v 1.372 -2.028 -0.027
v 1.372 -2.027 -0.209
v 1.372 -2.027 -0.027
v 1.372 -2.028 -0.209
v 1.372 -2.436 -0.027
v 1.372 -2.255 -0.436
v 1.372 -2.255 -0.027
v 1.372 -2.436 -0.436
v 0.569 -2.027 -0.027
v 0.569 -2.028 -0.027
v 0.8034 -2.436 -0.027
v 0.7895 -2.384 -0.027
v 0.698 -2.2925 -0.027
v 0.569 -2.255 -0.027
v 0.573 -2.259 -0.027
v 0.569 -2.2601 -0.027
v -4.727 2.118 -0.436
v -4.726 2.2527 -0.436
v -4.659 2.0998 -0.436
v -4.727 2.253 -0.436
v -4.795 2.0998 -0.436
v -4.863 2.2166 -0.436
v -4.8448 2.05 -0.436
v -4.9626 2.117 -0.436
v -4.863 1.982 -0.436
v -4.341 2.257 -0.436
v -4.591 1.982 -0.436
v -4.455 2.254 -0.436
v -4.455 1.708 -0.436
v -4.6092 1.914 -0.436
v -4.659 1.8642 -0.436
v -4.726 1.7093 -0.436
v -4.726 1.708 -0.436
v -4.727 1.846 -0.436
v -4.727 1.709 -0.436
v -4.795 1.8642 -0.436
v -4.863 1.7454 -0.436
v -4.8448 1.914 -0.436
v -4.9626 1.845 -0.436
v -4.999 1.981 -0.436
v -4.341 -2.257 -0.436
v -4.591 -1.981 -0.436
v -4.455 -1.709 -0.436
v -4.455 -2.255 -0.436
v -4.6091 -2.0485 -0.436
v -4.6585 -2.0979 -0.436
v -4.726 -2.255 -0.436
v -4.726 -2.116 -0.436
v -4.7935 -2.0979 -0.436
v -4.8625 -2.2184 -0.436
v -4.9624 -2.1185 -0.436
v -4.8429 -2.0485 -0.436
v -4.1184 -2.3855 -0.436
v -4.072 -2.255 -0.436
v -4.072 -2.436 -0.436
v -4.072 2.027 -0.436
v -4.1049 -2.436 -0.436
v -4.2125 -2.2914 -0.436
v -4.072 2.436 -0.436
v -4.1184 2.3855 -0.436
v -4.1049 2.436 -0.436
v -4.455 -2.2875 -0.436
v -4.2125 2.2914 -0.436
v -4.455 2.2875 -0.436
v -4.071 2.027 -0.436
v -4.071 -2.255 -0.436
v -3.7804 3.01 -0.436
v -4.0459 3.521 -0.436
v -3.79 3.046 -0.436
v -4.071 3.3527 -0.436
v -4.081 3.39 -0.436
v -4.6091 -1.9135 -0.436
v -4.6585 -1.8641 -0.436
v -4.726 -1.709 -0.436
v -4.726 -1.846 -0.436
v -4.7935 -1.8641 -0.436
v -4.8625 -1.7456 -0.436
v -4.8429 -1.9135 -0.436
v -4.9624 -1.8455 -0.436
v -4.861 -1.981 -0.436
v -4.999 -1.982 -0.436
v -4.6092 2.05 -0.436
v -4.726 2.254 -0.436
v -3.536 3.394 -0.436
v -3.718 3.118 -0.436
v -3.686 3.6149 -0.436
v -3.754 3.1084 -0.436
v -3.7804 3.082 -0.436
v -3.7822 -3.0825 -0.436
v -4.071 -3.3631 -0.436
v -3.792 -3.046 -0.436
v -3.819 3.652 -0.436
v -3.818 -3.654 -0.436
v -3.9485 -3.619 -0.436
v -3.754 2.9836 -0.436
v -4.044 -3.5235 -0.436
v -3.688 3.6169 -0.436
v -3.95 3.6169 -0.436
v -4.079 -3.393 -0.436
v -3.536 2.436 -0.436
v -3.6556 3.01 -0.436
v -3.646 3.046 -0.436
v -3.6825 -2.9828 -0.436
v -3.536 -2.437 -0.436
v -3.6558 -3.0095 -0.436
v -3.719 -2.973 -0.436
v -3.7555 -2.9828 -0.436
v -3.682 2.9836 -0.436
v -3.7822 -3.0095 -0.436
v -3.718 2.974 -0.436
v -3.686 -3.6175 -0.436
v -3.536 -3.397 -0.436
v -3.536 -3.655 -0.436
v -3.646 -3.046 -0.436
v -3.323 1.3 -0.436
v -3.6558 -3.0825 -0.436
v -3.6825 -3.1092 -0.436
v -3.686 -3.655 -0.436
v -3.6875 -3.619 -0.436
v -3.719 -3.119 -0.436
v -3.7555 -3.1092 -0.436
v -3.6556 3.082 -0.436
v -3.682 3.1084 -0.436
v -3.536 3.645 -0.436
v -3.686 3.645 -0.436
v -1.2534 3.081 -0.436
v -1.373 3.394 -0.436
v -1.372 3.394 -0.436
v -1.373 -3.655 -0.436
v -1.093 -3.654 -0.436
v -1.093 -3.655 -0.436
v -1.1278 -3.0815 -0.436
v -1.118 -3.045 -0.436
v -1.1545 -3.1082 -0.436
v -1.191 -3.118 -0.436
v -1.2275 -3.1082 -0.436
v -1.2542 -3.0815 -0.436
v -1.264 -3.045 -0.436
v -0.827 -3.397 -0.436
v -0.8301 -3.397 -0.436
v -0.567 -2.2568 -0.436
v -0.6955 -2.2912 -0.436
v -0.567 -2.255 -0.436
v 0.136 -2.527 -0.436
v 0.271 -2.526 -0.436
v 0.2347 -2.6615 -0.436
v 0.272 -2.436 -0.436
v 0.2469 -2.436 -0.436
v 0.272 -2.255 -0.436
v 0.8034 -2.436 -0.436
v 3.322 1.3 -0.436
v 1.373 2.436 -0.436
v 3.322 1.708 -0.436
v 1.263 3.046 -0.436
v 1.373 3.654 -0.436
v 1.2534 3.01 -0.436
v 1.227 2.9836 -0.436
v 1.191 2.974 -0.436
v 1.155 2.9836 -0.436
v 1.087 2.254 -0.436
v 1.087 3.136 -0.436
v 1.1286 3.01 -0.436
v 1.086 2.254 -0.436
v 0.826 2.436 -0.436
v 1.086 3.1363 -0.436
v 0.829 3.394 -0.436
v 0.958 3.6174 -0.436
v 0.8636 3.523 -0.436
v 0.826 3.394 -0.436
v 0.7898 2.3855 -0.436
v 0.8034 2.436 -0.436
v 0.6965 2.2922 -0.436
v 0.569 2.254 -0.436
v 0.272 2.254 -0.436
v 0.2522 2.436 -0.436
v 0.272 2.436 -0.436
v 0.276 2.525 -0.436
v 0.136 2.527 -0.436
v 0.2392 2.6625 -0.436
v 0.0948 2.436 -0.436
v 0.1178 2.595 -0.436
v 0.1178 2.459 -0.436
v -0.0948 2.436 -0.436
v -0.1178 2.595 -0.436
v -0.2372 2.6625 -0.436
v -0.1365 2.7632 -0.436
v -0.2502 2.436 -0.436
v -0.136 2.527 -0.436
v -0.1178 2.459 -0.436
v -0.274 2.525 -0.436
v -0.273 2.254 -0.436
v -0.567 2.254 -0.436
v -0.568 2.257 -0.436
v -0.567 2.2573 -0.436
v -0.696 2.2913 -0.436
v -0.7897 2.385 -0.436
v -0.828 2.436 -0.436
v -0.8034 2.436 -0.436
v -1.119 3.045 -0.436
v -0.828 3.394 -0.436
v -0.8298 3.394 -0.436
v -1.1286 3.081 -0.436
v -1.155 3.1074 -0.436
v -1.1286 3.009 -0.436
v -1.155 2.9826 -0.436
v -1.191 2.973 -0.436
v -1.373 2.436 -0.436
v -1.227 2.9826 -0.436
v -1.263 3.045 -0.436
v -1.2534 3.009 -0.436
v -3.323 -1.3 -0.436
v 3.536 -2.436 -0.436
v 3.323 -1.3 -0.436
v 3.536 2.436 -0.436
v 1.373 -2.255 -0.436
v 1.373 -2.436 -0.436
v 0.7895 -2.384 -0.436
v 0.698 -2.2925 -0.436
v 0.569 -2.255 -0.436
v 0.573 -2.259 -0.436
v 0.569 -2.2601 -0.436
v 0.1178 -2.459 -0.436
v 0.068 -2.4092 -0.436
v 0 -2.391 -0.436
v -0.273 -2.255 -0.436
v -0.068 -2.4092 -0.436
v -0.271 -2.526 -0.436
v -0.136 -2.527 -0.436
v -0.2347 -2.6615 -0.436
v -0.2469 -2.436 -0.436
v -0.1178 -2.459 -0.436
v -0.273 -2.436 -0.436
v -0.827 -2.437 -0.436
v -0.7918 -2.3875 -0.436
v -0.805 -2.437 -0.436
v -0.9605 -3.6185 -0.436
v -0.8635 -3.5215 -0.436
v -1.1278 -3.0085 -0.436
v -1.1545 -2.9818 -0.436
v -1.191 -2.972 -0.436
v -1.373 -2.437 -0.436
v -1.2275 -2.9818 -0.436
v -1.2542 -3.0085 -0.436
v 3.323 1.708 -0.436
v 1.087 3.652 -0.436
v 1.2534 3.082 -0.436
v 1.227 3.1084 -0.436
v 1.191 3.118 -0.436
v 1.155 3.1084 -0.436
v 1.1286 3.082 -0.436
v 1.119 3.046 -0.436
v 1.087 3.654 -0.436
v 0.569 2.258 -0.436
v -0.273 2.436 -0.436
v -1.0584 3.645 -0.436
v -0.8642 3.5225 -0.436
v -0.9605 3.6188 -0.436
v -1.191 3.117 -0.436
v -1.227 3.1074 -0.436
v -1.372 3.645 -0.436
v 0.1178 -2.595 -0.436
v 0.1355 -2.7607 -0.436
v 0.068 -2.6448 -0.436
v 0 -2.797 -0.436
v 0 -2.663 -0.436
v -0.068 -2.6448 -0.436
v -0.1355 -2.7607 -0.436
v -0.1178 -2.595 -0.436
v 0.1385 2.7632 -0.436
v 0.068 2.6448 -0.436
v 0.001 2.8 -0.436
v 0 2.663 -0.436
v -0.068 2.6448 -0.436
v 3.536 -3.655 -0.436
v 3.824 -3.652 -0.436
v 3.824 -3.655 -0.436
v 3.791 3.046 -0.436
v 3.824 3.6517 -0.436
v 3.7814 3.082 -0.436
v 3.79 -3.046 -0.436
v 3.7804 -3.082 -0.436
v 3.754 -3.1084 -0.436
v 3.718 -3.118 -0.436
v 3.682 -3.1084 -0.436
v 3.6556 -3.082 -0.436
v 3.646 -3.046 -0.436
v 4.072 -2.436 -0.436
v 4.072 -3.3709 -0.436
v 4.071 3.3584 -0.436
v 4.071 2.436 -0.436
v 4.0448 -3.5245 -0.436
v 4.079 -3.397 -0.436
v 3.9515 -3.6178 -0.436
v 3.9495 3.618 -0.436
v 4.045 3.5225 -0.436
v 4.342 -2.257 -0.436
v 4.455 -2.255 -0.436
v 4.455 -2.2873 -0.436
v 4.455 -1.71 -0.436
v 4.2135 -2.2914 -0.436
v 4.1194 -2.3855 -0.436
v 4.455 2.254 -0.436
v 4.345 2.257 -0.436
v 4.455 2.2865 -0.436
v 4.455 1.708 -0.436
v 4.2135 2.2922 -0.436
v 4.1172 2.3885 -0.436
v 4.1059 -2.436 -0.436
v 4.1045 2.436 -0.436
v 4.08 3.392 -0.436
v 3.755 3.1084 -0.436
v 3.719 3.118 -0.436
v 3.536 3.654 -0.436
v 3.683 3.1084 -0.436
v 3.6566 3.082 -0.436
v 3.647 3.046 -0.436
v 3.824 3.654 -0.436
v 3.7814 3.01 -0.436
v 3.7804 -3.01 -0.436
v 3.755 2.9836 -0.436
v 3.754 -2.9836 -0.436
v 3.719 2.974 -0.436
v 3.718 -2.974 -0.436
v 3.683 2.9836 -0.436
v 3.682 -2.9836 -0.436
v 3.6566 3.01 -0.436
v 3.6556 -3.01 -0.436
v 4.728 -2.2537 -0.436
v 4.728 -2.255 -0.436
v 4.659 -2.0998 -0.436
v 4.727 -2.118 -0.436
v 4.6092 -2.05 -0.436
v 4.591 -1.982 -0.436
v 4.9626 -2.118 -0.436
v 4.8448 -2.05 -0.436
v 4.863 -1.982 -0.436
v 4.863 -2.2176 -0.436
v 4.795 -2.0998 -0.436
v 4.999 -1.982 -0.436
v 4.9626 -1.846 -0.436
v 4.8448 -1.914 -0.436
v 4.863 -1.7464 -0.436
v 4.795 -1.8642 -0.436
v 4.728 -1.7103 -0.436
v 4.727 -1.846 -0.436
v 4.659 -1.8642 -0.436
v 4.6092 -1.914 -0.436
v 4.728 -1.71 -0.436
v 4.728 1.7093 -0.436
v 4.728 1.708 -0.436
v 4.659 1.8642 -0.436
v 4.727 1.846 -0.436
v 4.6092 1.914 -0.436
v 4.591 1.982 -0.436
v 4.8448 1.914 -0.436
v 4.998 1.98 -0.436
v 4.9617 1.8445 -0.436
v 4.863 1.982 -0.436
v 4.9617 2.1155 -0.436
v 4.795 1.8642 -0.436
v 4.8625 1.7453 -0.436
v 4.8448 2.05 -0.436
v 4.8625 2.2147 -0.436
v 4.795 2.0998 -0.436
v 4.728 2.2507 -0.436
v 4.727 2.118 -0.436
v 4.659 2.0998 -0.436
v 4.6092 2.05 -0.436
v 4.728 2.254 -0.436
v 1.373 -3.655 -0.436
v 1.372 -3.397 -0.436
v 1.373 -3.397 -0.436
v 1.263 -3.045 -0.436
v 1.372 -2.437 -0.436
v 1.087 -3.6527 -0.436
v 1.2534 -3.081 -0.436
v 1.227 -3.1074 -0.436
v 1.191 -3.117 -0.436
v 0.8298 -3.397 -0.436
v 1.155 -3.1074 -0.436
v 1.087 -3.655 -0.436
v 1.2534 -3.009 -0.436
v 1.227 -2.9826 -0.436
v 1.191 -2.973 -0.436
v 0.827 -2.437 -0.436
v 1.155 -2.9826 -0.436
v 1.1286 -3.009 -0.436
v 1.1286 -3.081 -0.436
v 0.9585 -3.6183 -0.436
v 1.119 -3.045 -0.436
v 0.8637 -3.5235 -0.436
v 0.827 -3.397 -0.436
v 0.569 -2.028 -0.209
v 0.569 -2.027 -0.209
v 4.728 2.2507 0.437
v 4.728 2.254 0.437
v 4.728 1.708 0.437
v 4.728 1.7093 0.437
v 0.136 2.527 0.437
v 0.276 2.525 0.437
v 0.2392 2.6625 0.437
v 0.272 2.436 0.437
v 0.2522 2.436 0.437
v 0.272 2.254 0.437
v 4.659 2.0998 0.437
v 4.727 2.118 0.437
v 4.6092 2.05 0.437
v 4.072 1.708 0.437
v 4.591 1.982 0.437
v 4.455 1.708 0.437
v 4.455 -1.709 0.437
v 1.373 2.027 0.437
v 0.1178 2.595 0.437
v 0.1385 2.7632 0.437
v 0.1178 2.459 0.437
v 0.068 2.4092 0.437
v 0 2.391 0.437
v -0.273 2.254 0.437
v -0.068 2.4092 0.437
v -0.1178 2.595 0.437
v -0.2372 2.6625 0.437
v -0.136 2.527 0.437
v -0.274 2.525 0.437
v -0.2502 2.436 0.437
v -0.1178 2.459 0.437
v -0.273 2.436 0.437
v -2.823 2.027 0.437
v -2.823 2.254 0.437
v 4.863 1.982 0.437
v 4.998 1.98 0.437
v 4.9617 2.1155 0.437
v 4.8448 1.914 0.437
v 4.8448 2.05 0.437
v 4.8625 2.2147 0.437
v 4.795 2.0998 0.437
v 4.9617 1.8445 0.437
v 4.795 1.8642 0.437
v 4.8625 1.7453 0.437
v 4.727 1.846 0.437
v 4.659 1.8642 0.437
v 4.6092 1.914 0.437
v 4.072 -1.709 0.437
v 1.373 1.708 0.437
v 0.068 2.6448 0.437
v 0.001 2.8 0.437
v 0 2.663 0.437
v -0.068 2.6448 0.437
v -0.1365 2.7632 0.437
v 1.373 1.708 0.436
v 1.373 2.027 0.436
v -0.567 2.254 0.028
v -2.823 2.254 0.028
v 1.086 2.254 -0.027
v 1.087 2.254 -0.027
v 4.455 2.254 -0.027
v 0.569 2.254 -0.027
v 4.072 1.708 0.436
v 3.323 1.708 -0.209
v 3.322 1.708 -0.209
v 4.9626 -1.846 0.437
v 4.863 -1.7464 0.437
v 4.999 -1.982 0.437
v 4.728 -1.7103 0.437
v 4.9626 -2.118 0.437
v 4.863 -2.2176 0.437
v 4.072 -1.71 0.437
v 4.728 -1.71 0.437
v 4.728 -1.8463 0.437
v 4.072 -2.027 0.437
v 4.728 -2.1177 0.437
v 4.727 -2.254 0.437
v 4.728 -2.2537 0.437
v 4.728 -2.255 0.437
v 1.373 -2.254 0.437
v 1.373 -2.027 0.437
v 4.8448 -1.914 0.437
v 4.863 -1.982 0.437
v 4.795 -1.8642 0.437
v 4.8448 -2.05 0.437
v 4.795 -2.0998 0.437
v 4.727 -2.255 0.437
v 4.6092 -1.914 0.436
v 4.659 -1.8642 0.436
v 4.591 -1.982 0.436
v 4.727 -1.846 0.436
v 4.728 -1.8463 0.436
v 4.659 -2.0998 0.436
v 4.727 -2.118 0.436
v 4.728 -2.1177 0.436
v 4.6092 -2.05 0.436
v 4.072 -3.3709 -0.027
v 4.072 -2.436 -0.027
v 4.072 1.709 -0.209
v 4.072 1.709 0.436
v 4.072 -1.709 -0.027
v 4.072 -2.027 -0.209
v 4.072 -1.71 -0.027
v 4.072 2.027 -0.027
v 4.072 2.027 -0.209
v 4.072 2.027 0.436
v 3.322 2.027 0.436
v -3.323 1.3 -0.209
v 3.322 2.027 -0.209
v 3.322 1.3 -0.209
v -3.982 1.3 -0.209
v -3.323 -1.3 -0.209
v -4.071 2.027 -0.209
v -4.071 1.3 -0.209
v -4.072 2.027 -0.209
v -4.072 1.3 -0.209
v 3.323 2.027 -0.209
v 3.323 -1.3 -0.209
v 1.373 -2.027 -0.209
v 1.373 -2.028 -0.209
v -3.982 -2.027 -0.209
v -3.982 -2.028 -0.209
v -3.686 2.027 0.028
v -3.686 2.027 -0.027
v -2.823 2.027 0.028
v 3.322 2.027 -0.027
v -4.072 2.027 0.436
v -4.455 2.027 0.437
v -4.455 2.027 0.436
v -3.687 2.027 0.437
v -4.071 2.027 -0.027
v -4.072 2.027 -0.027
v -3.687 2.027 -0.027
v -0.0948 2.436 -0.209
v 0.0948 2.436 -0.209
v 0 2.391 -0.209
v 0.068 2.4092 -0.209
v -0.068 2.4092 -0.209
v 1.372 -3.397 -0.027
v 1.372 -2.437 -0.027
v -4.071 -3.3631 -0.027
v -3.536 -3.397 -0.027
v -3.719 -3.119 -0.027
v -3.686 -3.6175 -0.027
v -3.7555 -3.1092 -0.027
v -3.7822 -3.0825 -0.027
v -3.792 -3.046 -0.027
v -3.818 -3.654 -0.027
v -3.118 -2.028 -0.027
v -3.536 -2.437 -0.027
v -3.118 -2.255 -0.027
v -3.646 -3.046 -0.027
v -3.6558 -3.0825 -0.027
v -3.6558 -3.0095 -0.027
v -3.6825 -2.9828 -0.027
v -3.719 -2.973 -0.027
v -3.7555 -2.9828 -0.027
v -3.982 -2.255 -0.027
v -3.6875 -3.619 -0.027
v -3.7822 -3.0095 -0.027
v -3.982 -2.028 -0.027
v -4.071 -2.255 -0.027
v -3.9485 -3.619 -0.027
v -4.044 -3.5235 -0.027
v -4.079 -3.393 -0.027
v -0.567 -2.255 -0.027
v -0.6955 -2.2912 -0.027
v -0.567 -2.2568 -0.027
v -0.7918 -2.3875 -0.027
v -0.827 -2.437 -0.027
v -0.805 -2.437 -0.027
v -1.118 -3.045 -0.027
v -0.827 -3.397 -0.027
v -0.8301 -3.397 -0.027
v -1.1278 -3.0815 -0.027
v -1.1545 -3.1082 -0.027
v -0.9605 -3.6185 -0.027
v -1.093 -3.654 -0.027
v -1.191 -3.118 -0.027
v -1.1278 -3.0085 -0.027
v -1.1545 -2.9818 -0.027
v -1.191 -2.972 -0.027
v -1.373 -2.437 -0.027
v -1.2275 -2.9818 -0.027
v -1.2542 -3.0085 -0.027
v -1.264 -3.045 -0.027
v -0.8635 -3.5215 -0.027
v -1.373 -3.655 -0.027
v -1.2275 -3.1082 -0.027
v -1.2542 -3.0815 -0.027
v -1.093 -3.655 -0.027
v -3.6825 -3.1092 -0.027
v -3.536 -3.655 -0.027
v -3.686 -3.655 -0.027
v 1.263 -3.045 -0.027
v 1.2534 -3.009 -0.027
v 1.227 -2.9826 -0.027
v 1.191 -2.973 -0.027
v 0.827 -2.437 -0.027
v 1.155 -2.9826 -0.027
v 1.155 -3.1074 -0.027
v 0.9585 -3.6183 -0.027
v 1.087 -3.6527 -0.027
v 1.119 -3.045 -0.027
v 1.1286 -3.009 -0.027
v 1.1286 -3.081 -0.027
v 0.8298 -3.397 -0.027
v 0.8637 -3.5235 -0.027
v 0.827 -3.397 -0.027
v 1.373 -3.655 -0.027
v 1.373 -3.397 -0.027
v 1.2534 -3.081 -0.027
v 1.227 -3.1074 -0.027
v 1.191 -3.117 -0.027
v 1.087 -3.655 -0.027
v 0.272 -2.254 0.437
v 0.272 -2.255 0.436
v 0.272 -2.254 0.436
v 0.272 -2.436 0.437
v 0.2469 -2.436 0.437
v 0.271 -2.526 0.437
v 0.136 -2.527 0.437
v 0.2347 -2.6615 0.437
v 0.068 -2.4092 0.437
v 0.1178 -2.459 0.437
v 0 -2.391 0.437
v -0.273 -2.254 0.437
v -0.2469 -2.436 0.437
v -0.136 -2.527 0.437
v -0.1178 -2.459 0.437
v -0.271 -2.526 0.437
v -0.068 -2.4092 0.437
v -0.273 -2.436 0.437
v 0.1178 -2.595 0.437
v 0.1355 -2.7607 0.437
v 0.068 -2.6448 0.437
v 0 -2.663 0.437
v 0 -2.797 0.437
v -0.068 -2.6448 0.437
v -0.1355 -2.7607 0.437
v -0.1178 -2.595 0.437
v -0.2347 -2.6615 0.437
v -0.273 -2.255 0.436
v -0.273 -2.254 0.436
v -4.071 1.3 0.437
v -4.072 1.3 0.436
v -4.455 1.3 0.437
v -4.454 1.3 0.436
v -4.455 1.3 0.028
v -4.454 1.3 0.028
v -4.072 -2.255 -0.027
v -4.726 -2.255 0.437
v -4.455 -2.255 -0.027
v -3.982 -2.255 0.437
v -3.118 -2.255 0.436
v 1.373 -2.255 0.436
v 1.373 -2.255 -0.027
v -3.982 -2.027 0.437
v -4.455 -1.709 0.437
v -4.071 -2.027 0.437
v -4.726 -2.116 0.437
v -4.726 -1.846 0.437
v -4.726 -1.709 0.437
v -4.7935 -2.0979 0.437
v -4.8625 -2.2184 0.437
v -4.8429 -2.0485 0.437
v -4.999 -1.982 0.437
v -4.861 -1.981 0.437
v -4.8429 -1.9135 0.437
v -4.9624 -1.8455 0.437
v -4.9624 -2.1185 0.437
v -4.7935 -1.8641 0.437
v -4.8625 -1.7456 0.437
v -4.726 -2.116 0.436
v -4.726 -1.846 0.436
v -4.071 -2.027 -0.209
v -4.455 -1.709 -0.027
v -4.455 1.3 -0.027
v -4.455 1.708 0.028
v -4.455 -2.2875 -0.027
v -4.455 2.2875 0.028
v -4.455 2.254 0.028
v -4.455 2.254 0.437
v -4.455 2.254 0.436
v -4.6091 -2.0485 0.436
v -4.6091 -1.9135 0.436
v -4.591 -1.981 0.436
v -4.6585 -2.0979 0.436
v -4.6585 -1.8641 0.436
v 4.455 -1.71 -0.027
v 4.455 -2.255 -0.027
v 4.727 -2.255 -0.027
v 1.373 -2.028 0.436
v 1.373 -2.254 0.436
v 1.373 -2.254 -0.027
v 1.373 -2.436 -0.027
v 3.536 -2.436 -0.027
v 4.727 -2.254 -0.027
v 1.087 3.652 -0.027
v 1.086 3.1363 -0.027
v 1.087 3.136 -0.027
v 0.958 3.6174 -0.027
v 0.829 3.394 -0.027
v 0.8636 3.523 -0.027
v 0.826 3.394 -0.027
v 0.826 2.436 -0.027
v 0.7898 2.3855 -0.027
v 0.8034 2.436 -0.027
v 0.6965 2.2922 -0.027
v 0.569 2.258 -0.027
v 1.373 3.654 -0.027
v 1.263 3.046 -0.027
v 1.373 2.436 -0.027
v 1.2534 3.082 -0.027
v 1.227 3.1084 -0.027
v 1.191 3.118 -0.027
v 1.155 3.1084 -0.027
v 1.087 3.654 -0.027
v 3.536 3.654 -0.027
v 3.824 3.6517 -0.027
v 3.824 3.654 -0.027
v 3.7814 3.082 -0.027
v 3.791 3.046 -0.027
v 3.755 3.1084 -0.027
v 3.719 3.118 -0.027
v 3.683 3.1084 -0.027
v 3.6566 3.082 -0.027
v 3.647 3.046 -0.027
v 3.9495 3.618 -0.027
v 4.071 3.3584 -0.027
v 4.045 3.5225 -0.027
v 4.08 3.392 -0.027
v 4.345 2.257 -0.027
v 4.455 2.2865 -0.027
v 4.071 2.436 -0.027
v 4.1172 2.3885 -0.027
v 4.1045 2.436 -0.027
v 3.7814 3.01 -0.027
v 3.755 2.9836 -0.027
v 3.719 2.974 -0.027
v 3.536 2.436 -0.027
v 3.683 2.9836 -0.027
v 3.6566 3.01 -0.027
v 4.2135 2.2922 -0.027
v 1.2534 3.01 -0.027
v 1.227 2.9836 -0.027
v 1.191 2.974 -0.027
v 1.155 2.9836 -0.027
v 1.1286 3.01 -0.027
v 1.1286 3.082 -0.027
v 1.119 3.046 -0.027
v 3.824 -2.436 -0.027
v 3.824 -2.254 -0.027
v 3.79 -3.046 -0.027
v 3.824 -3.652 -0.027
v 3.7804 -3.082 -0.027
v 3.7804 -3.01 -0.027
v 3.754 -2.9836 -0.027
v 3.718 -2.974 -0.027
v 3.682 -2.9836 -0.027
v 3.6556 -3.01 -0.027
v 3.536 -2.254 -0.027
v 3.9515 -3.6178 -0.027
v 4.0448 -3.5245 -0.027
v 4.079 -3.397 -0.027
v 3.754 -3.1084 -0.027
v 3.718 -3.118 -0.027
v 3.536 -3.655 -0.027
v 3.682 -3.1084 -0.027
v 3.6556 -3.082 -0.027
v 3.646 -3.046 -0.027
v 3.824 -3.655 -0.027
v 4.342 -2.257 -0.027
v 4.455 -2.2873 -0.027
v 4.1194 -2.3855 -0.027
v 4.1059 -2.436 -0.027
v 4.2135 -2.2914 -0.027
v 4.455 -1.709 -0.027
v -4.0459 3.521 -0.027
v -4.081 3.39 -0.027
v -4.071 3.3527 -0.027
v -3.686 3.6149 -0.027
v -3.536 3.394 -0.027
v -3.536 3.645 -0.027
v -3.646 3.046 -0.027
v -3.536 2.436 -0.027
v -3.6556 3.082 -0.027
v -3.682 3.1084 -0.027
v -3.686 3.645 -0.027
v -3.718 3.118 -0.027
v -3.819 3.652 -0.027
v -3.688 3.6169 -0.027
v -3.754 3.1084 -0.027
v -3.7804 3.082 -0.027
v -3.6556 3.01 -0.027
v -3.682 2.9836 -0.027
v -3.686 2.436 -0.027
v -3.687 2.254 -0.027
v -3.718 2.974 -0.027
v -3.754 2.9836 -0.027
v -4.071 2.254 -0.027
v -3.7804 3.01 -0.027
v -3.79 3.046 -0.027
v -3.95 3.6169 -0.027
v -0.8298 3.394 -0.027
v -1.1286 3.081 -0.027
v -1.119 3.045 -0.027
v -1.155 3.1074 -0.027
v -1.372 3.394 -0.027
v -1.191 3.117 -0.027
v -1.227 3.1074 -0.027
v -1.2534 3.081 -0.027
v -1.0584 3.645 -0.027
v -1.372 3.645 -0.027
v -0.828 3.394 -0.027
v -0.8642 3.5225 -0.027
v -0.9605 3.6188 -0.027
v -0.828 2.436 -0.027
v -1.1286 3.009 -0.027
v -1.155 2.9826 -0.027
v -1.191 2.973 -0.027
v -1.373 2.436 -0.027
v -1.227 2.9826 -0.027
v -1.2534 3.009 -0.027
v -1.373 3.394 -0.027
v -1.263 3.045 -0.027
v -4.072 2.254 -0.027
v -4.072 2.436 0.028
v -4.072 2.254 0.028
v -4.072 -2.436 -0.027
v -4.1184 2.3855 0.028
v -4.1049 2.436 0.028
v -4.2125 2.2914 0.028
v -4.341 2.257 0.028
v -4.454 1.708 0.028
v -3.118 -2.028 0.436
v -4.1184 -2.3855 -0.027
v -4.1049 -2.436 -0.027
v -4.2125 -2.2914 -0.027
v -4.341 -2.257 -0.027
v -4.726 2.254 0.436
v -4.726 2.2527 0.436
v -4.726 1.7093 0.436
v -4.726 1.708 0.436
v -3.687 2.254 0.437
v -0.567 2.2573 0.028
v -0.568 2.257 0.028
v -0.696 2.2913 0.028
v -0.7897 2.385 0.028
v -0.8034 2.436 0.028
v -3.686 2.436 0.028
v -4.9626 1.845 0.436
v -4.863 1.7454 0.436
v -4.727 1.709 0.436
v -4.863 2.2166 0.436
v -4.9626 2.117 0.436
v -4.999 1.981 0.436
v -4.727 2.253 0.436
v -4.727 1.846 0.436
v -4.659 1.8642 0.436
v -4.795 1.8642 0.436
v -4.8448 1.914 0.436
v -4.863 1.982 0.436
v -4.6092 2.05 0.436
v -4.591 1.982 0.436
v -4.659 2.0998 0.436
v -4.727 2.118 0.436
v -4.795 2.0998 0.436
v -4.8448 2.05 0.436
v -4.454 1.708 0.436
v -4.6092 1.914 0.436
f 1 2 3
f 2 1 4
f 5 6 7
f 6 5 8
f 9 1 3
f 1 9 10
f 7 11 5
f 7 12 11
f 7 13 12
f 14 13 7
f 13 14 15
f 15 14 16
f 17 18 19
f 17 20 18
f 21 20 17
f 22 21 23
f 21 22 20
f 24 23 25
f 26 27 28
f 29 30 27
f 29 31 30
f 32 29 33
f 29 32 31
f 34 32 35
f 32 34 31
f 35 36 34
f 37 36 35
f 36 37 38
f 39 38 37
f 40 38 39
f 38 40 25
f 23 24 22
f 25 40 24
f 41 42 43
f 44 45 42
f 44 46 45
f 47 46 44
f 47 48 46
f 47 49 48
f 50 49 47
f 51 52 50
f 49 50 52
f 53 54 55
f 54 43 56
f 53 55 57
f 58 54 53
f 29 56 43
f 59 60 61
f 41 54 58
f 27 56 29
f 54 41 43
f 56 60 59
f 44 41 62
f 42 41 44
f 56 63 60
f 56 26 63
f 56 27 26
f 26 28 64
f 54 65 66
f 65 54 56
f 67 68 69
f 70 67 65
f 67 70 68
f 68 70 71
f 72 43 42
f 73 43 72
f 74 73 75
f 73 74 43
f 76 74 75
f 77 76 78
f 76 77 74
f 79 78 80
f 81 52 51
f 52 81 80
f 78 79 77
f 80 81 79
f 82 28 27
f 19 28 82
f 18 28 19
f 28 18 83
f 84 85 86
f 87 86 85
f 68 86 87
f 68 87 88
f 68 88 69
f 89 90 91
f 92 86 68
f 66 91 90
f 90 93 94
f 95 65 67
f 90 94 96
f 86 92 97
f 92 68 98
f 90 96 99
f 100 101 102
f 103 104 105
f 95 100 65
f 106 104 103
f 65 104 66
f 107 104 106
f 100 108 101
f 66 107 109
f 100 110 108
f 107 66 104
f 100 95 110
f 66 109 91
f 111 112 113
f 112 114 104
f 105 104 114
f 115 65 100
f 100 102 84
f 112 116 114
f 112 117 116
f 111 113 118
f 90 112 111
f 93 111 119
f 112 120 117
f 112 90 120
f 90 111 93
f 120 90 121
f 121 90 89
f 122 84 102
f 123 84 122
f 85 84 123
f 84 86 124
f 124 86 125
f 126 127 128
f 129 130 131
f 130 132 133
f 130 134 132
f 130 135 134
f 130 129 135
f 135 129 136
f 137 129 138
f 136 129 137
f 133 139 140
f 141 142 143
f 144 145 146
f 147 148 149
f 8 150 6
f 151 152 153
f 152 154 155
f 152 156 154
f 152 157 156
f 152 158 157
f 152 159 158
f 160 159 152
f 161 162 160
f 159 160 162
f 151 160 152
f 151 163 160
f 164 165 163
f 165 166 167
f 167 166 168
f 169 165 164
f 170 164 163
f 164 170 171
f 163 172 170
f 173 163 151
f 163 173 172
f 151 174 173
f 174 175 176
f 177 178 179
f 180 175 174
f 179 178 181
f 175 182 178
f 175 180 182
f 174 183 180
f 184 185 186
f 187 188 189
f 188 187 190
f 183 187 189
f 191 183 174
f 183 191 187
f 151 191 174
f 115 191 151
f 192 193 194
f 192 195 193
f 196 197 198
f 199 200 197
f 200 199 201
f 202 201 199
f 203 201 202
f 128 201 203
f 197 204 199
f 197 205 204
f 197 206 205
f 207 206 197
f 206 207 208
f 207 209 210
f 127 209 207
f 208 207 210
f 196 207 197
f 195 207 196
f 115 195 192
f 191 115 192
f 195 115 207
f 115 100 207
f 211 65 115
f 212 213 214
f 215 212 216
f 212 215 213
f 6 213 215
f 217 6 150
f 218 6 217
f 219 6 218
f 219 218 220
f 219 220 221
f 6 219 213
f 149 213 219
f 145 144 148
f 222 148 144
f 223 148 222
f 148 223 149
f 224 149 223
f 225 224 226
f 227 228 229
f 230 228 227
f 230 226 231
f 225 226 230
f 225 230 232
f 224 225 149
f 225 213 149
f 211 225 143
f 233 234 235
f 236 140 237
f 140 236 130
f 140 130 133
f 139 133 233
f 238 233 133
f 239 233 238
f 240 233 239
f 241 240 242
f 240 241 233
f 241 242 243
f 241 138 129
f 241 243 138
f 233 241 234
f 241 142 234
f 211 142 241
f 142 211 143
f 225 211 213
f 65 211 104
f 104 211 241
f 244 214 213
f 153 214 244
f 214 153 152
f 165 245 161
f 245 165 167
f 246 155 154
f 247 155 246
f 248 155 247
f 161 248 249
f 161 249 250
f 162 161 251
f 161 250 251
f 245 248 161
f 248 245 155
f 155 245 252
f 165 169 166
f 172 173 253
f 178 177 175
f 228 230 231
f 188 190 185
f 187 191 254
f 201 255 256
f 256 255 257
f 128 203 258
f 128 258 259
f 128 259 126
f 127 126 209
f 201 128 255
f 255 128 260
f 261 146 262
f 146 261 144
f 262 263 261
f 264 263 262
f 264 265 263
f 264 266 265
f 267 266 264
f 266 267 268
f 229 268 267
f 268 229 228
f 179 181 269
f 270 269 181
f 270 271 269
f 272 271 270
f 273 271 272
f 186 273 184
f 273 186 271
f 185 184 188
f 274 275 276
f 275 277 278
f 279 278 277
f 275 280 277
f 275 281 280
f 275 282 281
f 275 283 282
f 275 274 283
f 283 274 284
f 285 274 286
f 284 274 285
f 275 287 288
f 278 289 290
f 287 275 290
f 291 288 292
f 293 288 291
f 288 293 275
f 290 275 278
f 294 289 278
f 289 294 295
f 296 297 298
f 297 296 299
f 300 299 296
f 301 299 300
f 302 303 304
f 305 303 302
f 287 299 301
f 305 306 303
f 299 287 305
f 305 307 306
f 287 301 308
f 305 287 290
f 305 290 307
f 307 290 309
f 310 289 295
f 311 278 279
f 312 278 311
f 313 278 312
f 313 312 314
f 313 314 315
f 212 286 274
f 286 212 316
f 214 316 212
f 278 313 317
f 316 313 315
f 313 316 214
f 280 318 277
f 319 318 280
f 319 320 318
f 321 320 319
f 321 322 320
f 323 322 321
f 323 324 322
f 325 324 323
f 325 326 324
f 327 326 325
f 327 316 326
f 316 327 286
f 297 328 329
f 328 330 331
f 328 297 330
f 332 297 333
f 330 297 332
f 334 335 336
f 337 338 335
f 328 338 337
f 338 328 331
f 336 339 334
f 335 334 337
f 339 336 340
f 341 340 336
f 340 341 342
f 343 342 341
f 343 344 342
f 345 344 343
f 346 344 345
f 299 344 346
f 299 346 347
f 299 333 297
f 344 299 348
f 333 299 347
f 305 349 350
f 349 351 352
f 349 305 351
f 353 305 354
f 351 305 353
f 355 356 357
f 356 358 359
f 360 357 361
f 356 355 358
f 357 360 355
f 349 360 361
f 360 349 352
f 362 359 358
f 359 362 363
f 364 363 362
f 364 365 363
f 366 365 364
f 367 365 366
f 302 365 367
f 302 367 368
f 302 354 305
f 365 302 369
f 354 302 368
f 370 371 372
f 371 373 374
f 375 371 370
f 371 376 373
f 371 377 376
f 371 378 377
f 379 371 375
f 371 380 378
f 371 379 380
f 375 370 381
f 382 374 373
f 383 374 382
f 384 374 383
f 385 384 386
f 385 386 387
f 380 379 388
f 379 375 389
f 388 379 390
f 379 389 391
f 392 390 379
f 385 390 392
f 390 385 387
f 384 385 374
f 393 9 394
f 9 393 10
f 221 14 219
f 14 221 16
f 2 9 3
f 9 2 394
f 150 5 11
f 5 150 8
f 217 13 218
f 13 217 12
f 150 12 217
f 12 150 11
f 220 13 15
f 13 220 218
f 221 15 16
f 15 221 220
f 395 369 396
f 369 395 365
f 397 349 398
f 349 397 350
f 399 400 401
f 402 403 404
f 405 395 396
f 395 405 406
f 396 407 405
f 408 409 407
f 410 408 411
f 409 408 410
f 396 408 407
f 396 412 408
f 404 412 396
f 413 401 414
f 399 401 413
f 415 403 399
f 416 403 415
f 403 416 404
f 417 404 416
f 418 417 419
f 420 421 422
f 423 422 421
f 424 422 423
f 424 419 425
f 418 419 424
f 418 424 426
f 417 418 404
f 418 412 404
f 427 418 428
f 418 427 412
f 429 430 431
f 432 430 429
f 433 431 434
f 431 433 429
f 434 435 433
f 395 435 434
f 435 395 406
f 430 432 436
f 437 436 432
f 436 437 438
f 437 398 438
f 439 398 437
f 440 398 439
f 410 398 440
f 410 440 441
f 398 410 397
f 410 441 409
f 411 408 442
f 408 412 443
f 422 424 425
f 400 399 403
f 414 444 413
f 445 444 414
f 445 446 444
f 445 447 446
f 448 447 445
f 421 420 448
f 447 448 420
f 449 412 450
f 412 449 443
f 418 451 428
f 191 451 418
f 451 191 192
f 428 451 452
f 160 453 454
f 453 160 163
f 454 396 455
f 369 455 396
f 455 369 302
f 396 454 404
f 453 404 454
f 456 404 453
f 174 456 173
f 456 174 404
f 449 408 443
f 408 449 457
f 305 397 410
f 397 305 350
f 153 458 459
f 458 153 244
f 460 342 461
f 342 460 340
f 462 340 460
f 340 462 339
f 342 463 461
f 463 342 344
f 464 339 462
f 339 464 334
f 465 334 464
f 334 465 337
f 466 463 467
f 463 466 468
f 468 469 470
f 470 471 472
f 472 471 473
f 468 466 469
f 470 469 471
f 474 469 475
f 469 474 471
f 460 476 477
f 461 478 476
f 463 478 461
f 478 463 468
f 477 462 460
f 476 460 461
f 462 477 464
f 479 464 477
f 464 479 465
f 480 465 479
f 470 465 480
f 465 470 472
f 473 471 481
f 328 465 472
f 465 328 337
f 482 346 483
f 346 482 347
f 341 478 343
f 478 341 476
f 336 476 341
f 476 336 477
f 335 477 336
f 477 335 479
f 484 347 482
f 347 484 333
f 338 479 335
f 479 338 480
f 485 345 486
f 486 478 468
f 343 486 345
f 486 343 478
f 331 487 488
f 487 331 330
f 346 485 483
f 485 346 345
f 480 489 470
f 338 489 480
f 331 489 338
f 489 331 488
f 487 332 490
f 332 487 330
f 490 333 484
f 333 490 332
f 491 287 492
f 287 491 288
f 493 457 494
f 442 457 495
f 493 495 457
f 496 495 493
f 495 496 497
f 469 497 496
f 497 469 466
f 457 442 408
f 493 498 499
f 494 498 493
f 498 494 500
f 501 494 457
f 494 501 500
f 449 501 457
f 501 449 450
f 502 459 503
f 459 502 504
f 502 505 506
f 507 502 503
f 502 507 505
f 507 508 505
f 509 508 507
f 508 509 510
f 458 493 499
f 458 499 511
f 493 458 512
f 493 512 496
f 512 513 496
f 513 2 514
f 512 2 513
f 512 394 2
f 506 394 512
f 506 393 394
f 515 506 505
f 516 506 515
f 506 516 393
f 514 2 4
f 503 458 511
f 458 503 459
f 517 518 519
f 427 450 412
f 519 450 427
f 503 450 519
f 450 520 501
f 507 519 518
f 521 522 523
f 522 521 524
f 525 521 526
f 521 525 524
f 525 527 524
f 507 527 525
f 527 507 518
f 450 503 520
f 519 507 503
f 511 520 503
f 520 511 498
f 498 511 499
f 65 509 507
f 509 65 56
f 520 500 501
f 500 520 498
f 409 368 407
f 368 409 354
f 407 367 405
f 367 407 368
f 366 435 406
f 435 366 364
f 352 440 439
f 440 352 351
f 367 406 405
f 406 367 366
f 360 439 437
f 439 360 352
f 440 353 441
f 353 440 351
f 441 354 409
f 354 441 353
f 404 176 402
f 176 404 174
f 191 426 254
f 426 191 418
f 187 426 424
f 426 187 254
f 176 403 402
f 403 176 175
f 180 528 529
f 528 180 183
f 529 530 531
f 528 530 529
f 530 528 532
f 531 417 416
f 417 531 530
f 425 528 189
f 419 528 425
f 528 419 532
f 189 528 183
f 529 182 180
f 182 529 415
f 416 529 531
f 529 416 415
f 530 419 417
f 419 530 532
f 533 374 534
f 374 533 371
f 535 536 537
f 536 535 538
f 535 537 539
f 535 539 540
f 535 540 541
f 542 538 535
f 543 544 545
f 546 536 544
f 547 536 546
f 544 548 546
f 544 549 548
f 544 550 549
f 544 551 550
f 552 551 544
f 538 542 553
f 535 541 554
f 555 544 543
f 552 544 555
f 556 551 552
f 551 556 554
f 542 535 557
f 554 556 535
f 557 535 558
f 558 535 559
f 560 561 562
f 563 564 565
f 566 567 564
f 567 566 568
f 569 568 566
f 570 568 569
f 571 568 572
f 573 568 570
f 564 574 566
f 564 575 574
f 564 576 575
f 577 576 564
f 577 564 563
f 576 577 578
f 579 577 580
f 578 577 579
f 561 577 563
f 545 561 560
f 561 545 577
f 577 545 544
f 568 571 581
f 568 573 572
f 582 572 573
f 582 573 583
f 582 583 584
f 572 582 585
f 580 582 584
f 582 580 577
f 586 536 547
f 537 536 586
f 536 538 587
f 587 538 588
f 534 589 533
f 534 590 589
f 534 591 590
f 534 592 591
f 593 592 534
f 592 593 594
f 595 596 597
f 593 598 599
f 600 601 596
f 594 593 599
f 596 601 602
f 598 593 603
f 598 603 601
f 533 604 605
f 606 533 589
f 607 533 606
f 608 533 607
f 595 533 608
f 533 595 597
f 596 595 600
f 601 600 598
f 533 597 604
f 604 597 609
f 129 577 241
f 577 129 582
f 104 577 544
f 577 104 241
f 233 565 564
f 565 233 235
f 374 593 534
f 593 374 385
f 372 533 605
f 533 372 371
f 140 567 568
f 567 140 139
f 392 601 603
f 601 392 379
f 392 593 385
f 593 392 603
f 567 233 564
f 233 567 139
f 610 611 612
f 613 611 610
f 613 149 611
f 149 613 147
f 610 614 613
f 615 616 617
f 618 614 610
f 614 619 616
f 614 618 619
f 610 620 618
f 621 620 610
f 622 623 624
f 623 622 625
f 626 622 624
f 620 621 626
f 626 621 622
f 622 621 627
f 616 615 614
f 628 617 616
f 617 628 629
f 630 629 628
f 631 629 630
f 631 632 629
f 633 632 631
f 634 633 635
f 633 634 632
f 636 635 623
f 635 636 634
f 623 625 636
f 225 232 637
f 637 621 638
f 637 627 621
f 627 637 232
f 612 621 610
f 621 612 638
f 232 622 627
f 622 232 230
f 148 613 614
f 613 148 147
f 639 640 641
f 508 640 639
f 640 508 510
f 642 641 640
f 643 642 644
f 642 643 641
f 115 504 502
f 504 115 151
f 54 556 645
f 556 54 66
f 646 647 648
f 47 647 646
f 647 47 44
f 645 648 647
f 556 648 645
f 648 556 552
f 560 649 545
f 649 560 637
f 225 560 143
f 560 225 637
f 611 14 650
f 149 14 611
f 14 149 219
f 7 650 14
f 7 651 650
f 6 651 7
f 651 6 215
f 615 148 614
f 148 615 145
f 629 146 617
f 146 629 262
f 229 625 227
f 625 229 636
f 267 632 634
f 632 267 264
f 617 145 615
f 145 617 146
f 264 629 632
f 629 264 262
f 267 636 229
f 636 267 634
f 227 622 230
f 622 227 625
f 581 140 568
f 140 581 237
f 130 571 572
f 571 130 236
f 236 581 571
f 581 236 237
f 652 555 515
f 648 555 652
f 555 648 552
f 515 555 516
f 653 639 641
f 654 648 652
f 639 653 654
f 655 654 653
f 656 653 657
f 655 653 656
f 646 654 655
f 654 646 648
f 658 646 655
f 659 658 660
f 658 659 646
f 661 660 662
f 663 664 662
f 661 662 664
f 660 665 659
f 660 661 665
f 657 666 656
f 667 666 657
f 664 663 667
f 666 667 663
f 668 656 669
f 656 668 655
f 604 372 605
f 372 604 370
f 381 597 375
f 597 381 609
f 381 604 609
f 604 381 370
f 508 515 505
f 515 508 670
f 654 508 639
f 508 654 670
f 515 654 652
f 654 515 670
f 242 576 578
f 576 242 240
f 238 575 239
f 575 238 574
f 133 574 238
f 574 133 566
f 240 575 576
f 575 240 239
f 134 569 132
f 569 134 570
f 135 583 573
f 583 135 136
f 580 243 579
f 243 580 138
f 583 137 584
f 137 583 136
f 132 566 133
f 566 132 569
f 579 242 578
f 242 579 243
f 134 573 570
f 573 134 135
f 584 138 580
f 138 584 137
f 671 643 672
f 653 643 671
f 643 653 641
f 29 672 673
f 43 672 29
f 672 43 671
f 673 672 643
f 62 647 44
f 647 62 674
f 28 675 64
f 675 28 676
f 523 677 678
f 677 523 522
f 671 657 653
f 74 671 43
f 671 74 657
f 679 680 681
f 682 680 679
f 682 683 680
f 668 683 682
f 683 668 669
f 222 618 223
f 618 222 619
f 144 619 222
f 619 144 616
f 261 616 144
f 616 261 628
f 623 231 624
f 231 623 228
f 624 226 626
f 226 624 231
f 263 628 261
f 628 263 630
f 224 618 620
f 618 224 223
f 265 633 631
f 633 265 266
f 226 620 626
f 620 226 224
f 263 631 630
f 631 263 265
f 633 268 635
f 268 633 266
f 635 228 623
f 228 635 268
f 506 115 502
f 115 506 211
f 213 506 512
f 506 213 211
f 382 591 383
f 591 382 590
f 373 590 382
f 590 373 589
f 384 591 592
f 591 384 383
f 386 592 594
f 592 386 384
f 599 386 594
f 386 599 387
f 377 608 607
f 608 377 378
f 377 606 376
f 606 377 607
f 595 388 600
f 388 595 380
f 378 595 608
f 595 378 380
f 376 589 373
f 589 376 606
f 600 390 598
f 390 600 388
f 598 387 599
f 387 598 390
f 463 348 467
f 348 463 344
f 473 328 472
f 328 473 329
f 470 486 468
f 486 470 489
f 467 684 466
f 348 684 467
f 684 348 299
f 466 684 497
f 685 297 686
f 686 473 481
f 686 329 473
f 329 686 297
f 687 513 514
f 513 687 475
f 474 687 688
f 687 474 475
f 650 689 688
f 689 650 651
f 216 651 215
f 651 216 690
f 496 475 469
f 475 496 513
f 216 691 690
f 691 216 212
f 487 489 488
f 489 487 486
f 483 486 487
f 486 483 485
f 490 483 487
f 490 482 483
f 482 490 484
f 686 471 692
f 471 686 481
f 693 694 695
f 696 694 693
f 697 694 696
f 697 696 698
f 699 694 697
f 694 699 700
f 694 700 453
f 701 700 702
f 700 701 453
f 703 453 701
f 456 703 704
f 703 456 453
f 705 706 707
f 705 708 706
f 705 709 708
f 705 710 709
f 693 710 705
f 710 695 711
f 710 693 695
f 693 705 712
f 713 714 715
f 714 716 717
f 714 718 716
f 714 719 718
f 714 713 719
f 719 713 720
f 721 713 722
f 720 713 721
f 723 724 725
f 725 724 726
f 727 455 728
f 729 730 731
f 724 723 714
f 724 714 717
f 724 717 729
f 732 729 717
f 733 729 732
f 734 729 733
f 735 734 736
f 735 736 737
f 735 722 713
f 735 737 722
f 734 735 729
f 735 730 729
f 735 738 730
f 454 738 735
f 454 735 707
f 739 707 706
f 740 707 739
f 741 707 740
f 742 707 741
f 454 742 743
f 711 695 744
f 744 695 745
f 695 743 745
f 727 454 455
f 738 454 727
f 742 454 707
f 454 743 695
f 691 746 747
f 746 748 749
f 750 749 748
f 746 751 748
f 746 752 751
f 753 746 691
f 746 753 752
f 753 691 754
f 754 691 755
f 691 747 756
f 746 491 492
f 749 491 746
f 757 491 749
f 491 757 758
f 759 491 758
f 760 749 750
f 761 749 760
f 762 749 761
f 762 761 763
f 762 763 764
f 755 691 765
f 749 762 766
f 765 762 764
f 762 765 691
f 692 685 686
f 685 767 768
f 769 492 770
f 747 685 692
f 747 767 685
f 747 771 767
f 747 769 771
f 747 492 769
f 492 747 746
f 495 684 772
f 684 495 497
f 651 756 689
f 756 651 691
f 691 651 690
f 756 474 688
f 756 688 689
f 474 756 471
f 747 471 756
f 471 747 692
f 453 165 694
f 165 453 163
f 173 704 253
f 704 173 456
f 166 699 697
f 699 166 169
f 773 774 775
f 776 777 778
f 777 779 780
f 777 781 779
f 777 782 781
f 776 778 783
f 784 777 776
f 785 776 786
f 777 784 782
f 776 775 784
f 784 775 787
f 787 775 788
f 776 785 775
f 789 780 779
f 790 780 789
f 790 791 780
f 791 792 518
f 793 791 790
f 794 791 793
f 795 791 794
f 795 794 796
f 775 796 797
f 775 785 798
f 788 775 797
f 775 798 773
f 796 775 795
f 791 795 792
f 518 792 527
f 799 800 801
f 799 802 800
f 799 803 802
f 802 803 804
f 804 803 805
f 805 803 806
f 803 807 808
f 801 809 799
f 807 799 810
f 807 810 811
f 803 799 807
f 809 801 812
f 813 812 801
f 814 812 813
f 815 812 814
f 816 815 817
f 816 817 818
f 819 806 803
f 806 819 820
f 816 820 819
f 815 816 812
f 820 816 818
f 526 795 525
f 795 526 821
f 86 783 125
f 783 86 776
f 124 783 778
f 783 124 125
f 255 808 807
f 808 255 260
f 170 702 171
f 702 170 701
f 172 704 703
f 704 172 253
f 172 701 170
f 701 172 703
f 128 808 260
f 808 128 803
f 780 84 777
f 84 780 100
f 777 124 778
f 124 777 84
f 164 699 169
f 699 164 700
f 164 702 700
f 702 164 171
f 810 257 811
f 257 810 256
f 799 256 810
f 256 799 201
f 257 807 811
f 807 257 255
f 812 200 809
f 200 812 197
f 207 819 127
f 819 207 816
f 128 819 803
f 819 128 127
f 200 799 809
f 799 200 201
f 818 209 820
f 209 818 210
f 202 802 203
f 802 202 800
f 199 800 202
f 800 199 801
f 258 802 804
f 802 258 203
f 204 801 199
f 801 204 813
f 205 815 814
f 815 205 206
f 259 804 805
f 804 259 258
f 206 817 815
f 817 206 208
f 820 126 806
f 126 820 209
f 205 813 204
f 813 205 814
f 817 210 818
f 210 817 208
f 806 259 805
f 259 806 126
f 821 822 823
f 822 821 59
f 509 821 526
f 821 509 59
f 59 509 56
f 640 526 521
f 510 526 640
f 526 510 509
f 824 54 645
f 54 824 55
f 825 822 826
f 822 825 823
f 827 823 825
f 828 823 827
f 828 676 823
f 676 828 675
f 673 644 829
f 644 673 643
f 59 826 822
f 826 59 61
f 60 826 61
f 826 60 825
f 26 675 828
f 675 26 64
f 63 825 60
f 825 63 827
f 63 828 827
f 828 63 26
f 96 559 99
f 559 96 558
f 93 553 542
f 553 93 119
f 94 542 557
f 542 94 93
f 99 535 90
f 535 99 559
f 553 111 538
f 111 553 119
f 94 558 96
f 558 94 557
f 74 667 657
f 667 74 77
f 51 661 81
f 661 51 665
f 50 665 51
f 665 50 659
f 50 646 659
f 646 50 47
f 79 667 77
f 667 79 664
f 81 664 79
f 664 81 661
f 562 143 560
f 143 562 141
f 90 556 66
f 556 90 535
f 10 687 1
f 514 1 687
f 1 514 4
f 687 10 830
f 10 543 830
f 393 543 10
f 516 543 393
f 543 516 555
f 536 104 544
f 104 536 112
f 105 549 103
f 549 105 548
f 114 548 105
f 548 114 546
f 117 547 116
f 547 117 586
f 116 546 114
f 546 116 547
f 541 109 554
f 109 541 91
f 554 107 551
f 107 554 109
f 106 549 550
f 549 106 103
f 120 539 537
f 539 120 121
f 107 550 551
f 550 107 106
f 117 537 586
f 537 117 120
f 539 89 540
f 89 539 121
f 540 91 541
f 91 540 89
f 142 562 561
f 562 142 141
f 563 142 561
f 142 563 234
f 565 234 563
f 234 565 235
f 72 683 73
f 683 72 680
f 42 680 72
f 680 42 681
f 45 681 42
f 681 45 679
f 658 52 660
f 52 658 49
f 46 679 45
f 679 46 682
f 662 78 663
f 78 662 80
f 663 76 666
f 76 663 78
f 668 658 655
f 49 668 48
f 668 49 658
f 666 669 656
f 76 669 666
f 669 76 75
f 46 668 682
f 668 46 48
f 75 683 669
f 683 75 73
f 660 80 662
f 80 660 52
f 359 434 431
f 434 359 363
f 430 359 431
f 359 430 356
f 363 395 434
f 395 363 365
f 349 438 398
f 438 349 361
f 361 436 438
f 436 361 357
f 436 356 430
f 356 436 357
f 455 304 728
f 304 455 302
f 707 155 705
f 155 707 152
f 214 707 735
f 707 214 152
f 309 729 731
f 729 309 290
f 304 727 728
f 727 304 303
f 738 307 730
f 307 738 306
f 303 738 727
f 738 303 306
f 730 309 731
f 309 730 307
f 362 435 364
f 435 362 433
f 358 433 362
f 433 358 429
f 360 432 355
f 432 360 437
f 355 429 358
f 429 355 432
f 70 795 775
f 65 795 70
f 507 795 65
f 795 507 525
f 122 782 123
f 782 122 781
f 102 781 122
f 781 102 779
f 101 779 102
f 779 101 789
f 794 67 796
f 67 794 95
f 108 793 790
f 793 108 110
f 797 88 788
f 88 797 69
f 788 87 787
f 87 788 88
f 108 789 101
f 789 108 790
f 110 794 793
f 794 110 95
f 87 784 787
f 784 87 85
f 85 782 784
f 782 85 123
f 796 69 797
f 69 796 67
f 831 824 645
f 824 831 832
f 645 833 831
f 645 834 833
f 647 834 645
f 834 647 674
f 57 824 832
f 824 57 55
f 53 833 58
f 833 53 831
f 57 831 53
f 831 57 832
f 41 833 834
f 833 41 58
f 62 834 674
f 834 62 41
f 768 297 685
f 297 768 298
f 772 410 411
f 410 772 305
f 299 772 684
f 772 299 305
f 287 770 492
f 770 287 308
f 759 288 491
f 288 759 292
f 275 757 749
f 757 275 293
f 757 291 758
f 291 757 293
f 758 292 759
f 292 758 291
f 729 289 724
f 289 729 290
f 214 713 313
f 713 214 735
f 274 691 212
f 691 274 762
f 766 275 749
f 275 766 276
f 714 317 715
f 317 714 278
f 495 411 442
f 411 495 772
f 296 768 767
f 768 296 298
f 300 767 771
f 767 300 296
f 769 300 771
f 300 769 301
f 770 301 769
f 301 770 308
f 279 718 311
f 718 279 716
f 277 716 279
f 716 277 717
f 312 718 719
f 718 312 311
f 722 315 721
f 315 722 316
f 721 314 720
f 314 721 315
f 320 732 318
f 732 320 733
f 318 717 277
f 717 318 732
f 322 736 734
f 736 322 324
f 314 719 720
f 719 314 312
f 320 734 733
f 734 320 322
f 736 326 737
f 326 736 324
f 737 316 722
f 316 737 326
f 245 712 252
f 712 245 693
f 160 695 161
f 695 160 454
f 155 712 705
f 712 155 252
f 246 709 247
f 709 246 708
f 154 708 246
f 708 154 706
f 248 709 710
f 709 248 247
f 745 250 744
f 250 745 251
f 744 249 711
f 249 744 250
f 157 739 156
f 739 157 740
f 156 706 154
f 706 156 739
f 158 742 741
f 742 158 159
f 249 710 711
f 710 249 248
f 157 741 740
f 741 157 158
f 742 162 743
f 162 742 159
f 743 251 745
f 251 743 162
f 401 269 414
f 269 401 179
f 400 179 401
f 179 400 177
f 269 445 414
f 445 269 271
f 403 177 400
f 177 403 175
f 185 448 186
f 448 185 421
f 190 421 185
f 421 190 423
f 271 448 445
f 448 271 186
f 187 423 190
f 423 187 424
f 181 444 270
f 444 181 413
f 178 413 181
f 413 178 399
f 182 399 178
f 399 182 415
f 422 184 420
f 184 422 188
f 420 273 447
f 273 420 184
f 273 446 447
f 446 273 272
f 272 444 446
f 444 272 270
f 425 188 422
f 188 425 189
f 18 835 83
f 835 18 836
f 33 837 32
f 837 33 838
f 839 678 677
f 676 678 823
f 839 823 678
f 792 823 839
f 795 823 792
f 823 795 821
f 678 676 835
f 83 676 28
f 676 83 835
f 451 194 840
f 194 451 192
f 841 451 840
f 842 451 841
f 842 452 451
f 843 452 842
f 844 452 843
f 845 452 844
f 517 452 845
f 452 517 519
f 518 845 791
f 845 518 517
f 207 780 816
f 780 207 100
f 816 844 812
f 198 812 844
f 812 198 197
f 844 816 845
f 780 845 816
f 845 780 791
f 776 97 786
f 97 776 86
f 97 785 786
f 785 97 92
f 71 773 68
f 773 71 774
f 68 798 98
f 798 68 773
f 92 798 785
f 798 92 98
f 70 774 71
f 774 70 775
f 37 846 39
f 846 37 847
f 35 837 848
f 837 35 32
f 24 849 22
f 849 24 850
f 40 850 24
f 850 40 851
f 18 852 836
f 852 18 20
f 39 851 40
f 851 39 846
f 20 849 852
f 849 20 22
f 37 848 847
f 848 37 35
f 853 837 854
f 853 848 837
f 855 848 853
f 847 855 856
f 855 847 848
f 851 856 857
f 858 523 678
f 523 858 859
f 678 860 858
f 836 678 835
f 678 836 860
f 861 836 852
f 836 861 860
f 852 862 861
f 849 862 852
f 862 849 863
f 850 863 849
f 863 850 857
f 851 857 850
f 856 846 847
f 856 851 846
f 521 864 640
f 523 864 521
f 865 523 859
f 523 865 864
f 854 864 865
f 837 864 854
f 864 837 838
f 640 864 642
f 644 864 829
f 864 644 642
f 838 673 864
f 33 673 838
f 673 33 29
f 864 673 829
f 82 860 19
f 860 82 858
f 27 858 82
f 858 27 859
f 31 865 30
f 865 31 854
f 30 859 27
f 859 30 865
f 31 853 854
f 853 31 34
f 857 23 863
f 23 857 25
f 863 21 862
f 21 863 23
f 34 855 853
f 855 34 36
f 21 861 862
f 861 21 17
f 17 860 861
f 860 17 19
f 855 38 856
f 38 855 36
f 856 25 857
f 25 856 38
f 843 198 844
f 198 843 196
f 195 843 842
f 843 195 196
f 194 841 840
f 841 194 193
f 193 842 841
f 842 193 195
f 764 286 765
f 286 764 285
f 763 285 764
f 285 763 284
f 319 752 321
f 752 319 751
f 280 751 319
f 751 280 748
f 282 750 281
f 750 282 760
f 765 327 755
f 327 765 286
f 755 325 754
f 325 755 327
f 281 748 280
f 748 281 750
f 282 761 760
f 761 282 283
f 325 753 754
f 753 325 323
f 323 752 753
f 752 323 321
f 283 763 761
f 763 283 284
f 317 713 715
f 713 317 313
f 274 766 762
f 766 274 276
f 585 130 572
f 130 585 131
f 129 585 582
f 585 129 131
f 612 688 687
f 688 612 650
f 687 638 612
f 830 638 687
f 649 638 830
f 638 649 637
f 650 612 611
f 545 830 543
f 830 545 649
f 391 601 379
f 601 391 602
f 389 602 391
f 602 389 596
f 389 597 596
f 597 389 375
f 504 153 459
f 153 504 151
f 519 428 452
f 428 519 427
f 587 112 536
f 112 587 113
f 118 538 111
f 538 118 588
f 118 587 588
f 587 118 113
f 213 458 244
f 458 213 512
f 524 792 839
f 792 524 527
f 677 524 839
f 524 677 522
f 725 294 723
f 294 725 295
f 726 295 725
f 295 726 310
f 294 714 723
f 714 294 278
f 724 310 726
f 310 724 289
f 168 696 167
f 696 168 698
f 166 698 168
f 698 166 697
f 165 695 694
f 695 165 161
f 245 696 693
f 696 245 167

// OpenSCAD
intersection() {
union() {
difference() {
translate([0.569, -2.436, -0.436]) cube(size = [0.803, 0.409, 0.409], center = false);
translate([0.573, -2.509, -18.1])
cylinder(h = 18.073, r1 = 0.25, r2 = 0.25, center = false, $fn = 12);
}
difference() {
union() {
translate([1.373, 1.708, -0.436]) cube(size = [3.355, 0.546, 0.873], center = false);
translate([4.727, -1.982, -0.436])
cylinder(h = 0.873, r1 = 0.272, r2 = 0.272, center = false, $fn = 12);
}
union() {
translate([4.727, -1.982, -0.436])
cylinder(h = 18.536, r1 = 0.136, r2 = 0.136, center = false, $fn = 12);
translate([-18.1, -3.397, -0.209]) cube(size = [22.172, 5.424, 0.645], center = false);
translate([4.727, 1.982, -18.1])
cylinder(h = 36.2, r1 = 0.136, r2 = 0.136, center = false, $fn = 12);
}
}
difference() {
translate([-0.273, 2.027, -0.436]) cube(size = [0.545, 0.409, 0.873], center = false);
translate([0, 2.527, -0.209])
cylinder(h = 18.309, r1 = 0.136, r2 = 0.136, center = false, $fn = 12);
}
difference() {
union() {
translate([-0.273, -2.436, -0.436]) cube(size = [0.545, 0.182, 0.873], center = false);
translate([-4.455, -2.255, -0.436]) cube(size = [8.278, 3.555, 0.227], center = false);
translate([0, -2.526, -0.436])
cylinder(h = 0.873, r1 = 0.271, r2 = 0.271, center = false, $fn = 12);
translate([-1.093, -3.389, -0.436])
cylinder(h = 0.409, r1 = 0.265, r2 = 0.265, center = false, $fn = 12);
difference() {
translate([-1.373, -3.397, -0.436]) cube(size = [2.745, 0.96, 0.409], center = false);
translate([-0.827, -3.397, -18.1]) cube(size = [1.654, 0.96, 36.2], center = false);
}
translate([-4.726, -2.255, -0.436]) cube(size = [0.744, 3.555, 0.873], center = false);
translate([1.087, -3.655, -0.436]) cube(size = [0.286, 0.258, 0.409], center = false);
}
union() {
translate([-4.071, -2.027, -0.209]) cube(size = [0.089, 3.327, 18.309], center = false);
translate([-1.191, -3.045, -18.1])
cylinder(h = 36.2, r1 = 0.073, r2 = 0.073, center = false, $fn = 12);
translate([-4.726, -1.709, -0.436]) cube(size = [0.271, 3.009, 0.873], center = false);
translate([-4.726, -1.982, -18.1])
cylinder(h = 18.536, r1 = 0.273, r2 = 0.273, center = false, $fn = 12);
translate([0, -2.527, -0.436])
cylinder(h = 18.536, r1 = 0.136, r2 = 0.136, center = false, $fn = 12);
translate([-3.323, -1.3, -0.436]) cube(size = [7.147, 2.6, 0.409], center = false);
translate([1.191, -3.045, -18.1])
cylinder(h = 36.2, r1 = 0.072, r2 = 0.072, center = false, $fn = 12);
}
}
difference() {
union() {
translate([4.072, -2.255, -0.436]) cube(size = [0.656, 0.545, 0.873], center = false);
translate([1.373, -2.436, -0.436]) cube(size = [2.699, 0.409, 0.873], center = false);
}
union() {
translate([4.727, -1.982, -18.1])
cylinder(h = 18.536, r1 = 0.272, r2 = 0.272, center = false, $fn = 12);
translate([-18.1, -2.436, -0.027]) cube(size = [22.827, 0.182, 0.464], center = false);
}
}
difference() {
difference() {
union() {
translate([0.569, 2.027, -0.436]) cube(size = [0.517, 1.367, 0.409], center = false);
translate([-3.686, 3.384, -0.436]) cube(size = [2.859, 0.261, 0.409], center = false);
}
translate([0.569, 2.513, -18.1])
cylinder(h = 18.536, r1 = 0.255, r2 = 0.255, center = false, $fn = 12);
}
difference() {
union() {
translate([-3.536, 2.255, -0.436]) cube(size = [2.164, 1.4, 0.873], center = false);
translate([-1.093, 2.436, -0.436]) cube(size = [1.919, 1.218, 0.873], center = false);
}
translate([-1.092, 3.391, -0.436])
cylinder(h = 18.536, r1 = 0.263, r2 = 0.263, center = false, $fn = 12);
}
}
difference() {
translate([-1.373, 2.027, -0.436]) cube(size = [0.545, 1.367, 0.409], center = false);
translate([-1.191, 3.045, -18.1])
cylinder(h = 18.536, r1 = 0.072, r2 = 0.072, center = false, $fn = 12);
}
difference() {
translate([-4.455, 1.3, -0.436]) cube(size = [0.383, 1.136, 0.464], center = false);
translate([-4.341, 2.514, -18.1])
cylinder(h = 36.2, r1 = 0.257, r2 = 0.257, center = false, $fn = 12);
}
translate([-1.373, -3.655, -0.436]) cube(size = [0.28, 0.258, 0.409], center = false);
difference() {
union() {
translate([-3.818, -3.393, -0.436])
cylinder(h = 0.409, r1 = 0.261, r2 = 0.261, center = false, $fn = 12);
translate([-4.726, -1.982, -0.436])
cylinder(h = 0.873, r1 = 0.273, r2 = 0.273, center = false, $fn = 12);
translate([-4.071, -3.397, -0.436]) cube(size = [3.504, 1.369, 0.409], center = false);
}
union() {
translate([-3.536, -3.397, -0.436]) cube(size = [2.969, 0.96, 18.536], center = false);
translate([-3.719, -3.046, -0.436])
cylinder(h = 18.536, r1 = 0.073, r2 = 0.073, center = false, $fn = 12);
translate([-0.564, -2.519, -0.436])
cylinder(h = 18.536, r1 = 0.263, r2 = 0.263, center = false, $fn = 12);
translate([-4.726, -1.981, -0.436])
cylinder(h = 18.536, r1 = 0.135, r2 = 0.135, center = false, $fn = 12);
}
}
difference() {
union() {
translate([4.727, 1.98, -0.436])
cylinder(h = 0.873, r1 = 0.271, r2 = 0.271, center = false, $fn = 12);
translate([1.373, 2.027, -0.436]) cube(size = [3.082, 0.409, 0.409], center = false);
}
union() {
translate([4.345, 2.52, -18.1])
cylinder(h = 36.2, r1 = 0.263, r2 = 0.263, center = false, $fn = 12);
translate([4.727, 1.982, -18.1])
cylinder(h = 36.2, r1 = 0.136, r2 = 0.136, center = false, $fn = 12);
}
}
translate([-3.118, -2.255, -0.209]) cube(size = [4.491, 0.227, 0.645], center = false);
translate([1.088, -3.394, -0.436])
cylinder(h = 0.409, r1 = 0.259, r2 = 0.259, center = false, $fn = 12);
difference() {
translate([-4.071, 2.027, -0.436]) cube(size = [0.535, 1.367, 0.409], center = false);
translate([-3.718, 3.046, -18.1])
cylinder(h = 18.073, r1 = 0.072, r2 = 0.072, center = false, $fn = 12);
}
difference() {
translate([-4.455, -2.436, -0.436]) cube(size = [0.383, 3.736, 0.409], center = false);
translate([-4.341, -2.514, -18.1])
cylinder(h = 36.2, r1 = 0.257, r2 = 0.257, center = false, $fn = 12);
}
difference() {
union() {
translate([4.072, -2.436, -0.436]) cube(size = [0.383, 4.145, 0.873], center = false);
translate([3.824, -3.397, -0.436])
cylinder(h = 0.409, r1 = 0.255, r2 = 0.255, center = false, $fn = 12);
translate([3.536, 2.027, -0.436]) cube(size = [0.535, 1.367, 0.409], center = false);
translate([3.824, -3.397, -0.436]) cube(size = [0.248, 1.369, 0.409], center = false);
}
union() {
translate([3.536, -2.436, -0.027]) cube(size = [14.564, 0.727, 18.127], center = false);
translate([4.342, -2.514, -18.1])
cylinder(h = 18.536, r1 = 0.257, r2 = 0.257, center = false, $fn = 12);
translate([3.719, 3.046, -18.1])
cylinder(h = 36.2, r1 = 0.072, r2 = 0.072, center = false, $fn = 12);
}
}
translate([-4.455, 1.3, -0.436]) cube(size = [7.777, 0.727, 0.227], center = false);
translate([-2.823, 2.027, -0.436]) cube(size = [6.145, 0.227, 0.873], center = false);
translate([-3.686, -3.655, -0.436]) cube(size = [0.15, 0.258, 0.409], center = false);
difference() {
translate([1.087, 2.027, -0.436]) cube(size = [0.286, 1.627, 0.409], center = false);
translate([1.191, 3.046, -0.436])
cylinder(h = 18.536, r1 = 0.072, r2 = 0.072, center = false, $fn = 12);
}
difference() {
translate([0.001, 2.525, -0.436])
cylinder(h = 0.873, r1 = 0.275, r2 = 0.275, center = false, $fn = 12);
translate([0, 2.527, -18.1])
cylinder(h = 36.2, r1 = 0.136, r2 = 0.136, center = false, $fn = 12);
}
translate([3.323, -2.436, -0.436]) cube(size = [0.749, 4.464, 0.227], center = false);
intersection() {
union() {
translate([-4.726, -18.1, -0.436]) cube(size = [0.654, 20.354, 0.873], center = false);
translate([-3.686, 2.027, -0.436]) cube(size = [3.119, 0.409, 0.464], center = false);
translate([-3.819, 3.39, -0.436])
cylinder(h = 0.409, r1 = 0.262, r2 = 0.262, center = false, $fn = 12);
translate([-4.727, 1.981, -0.436])
cylinder(h = 18.536, r1 = 0.272, r2 = 0.272, center = false, $fn = 12);
}
difference() {
difference() {
translate([-18.1, 1.3, -18.1]) cube(size = [19.473, 16.8, 18.536], center = false);
translate([-18.1, 1.3, -0.436]) cube(size = [13.646, 0.408, 18.536], center = false);
}
union() {
translate([-4.727, 1.982, -18.1])
cylinder(h = 36.2, r1 = 0.136, r2 = 0.136, center = false, $fn = 12);
translate([-0.568, 2.513, -18.1])
cylinder(h = 36.2, r1 = 0.256, r2 = 0.256, center = false, $fn = 12);
}
}
}
translate([-4.455, 2.027, -0.027]) cube(size = [0.768, 0.227, 0.464], center = false);
difference() {
translate([3.536, -3.655, -0.436]) cube(size = [0.288, 7.309, 0.409], center = false);
union() {
translate([3.718, -3.046, -0.436])
cylinder(h = 18.536, r1 = 0.072, r2 = 0.072, center = false, $fn = 12);
translate([3.536, -2.027, -18.1]) cube(size = [0.288, 5.421, 36.2], center = false);
}
}
translate([3.819, 3.392, -0.436])
cylinder(h = 0.409, r1 = 0.261, r2 = 0.261, center = false, $fn = 12);
translate([1.087, 3.394, -0.436])
cylinder(h = 0.409, r1 = 0.258, r2 = 0.258, center = false, $fn = 12);
}
translate([-6, -4.385, -0.524]) cube(size = [12, 8.771, 1.047], center = false);
}
